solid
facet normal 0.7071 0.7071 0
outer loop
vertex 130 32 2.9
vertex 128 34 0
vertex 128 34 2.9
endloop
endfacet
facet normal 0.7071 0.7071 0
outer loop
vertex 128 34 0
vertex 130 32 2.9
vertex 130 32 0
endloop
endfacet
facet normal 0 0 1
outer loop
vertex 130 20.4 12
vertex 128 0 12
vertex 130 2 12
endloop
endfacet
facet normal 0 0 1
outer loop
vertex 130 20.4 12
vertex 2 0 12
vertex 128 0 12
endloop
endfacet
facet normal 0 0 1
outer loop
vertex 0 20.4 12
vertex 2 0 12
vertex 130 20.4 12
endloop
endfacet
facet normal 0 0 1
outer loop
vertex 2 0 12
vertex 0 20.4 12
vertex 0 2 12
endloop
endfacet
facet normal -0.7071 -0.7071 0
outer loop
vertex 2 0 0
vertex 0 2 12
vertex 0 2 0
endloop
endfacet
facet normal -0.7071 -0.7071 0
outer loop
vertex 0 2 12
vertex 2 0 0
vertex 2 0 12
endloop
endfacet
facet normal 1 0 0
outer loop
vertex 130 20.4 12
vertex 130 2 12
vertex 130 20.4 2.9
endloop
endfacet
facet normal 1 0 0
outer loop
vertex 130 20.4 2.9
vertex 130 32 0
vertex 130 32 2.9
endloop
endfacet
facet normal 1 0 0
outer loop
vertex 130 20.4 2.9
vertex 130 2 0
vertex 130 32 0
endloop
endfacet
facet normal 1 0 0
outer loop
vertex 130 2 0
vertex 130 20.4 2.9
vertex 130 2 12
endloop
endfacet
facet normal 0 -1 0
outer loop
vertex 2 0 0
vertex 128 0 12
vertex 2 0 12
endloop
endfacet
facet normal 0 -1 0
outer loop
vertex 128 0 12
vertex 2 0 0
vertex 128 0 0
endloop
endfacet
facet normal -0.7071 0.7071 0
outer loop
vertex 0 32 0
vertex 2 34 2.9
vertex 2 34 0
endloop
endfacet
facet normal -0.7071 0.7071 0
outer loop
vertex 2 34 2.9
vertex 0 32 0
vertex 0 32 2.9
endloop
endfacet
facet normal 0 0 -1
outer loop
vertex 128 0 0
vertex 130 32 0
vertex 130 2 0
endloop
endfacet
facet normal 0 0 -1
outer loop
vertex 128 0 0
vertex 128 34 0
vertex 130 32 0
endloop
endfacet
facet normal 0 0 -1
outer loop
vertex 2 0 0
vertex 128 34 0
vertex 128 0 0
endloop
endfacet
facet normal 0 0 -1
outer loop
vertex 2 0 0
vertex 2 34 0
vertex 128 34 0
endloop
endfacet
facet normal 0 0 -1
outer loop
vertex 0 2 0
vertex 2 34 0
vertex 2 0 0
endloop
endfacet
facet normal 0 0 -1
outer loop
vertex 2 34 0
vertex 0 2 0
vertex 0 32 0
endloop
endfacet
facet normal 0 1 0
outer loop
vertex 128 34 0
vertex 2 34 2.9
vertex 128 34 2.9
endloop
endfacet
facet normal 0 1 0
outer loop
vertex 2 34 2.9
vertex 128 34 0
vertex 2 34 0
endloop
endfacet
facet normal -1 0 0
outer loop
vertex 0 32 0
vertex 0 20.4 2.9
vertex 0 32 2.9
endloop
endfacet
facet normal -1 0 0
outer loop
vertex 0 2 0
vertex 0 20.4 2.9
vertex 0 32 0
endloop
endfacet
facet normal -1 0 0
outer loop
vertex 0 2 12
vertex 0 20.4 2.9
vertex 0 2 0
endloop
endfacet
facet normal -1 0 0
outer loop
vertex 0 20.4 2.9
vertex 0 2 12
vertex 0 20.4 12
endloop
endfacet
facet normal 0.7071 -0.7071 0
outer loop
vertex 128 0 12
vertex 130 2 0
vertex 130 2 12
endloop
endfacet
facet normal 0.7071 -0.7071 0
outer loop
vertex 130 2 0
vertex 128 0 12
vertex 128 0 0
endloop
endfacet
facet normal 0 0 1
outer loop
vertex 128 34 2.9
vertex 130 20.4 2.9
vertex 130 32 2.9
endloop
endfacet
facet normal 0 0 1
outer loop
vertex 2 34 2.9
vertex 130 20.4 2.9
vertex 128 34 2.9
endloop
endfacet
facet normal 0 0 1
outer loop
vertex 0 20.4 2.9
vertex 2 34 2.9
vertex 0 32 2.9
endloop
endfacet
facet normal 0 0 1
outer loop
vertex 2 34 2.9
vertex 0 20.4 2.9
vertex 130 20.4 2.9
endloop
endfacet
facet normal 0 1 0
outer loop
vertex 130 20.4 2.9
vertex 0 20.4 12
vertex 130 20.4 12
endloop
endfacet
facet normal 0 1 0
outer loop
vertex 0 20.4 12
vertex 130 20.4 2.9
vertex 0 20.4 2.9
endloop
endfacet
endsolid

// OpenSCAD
$fn = 32;

// ----------------------------------------------------------------------
// Stepped bar: sidestep, 130 x 34 x 12/2.9 mm
// ----------------------------------------------------------------------

// --- parameters (mm) ---
bar_l = 130;              // bar length, X
bar_w = 34;               // bar width, Y
plate_t = 12;             // thickness of the thick zone, Z
thin_t = 2.9;             // thickness of the thin zone
corner_c = 2;             // corner chamfer of the bar
step_cut = 9.1;           // material removed from the thin zone
ledge_y = 20.4;           // start of the ledge from the front edge
depth_1 = 9.1;            // depth of cut 1 from the top face

profile = [[2, 0], [128, 0], [130, 2], [130, 32], [128, 34], [2, 34], [0, 32], [0, 2]];  // primary outline, 8 points, counter clockwise
void_1 = [[-1, 20.4], [131, 20.4], [131, 35], [-1, 35]];  // ledge cut along one edge, 4 points

// --- the one profile operation ---
difference() {
  linear_extrude(height = plate_t) polygon(points = profile);
  translate([0, 0, plate_t - depth_1])
    linear_extrude(height = depth_1 + 1) polygon(points = void_1);
}
